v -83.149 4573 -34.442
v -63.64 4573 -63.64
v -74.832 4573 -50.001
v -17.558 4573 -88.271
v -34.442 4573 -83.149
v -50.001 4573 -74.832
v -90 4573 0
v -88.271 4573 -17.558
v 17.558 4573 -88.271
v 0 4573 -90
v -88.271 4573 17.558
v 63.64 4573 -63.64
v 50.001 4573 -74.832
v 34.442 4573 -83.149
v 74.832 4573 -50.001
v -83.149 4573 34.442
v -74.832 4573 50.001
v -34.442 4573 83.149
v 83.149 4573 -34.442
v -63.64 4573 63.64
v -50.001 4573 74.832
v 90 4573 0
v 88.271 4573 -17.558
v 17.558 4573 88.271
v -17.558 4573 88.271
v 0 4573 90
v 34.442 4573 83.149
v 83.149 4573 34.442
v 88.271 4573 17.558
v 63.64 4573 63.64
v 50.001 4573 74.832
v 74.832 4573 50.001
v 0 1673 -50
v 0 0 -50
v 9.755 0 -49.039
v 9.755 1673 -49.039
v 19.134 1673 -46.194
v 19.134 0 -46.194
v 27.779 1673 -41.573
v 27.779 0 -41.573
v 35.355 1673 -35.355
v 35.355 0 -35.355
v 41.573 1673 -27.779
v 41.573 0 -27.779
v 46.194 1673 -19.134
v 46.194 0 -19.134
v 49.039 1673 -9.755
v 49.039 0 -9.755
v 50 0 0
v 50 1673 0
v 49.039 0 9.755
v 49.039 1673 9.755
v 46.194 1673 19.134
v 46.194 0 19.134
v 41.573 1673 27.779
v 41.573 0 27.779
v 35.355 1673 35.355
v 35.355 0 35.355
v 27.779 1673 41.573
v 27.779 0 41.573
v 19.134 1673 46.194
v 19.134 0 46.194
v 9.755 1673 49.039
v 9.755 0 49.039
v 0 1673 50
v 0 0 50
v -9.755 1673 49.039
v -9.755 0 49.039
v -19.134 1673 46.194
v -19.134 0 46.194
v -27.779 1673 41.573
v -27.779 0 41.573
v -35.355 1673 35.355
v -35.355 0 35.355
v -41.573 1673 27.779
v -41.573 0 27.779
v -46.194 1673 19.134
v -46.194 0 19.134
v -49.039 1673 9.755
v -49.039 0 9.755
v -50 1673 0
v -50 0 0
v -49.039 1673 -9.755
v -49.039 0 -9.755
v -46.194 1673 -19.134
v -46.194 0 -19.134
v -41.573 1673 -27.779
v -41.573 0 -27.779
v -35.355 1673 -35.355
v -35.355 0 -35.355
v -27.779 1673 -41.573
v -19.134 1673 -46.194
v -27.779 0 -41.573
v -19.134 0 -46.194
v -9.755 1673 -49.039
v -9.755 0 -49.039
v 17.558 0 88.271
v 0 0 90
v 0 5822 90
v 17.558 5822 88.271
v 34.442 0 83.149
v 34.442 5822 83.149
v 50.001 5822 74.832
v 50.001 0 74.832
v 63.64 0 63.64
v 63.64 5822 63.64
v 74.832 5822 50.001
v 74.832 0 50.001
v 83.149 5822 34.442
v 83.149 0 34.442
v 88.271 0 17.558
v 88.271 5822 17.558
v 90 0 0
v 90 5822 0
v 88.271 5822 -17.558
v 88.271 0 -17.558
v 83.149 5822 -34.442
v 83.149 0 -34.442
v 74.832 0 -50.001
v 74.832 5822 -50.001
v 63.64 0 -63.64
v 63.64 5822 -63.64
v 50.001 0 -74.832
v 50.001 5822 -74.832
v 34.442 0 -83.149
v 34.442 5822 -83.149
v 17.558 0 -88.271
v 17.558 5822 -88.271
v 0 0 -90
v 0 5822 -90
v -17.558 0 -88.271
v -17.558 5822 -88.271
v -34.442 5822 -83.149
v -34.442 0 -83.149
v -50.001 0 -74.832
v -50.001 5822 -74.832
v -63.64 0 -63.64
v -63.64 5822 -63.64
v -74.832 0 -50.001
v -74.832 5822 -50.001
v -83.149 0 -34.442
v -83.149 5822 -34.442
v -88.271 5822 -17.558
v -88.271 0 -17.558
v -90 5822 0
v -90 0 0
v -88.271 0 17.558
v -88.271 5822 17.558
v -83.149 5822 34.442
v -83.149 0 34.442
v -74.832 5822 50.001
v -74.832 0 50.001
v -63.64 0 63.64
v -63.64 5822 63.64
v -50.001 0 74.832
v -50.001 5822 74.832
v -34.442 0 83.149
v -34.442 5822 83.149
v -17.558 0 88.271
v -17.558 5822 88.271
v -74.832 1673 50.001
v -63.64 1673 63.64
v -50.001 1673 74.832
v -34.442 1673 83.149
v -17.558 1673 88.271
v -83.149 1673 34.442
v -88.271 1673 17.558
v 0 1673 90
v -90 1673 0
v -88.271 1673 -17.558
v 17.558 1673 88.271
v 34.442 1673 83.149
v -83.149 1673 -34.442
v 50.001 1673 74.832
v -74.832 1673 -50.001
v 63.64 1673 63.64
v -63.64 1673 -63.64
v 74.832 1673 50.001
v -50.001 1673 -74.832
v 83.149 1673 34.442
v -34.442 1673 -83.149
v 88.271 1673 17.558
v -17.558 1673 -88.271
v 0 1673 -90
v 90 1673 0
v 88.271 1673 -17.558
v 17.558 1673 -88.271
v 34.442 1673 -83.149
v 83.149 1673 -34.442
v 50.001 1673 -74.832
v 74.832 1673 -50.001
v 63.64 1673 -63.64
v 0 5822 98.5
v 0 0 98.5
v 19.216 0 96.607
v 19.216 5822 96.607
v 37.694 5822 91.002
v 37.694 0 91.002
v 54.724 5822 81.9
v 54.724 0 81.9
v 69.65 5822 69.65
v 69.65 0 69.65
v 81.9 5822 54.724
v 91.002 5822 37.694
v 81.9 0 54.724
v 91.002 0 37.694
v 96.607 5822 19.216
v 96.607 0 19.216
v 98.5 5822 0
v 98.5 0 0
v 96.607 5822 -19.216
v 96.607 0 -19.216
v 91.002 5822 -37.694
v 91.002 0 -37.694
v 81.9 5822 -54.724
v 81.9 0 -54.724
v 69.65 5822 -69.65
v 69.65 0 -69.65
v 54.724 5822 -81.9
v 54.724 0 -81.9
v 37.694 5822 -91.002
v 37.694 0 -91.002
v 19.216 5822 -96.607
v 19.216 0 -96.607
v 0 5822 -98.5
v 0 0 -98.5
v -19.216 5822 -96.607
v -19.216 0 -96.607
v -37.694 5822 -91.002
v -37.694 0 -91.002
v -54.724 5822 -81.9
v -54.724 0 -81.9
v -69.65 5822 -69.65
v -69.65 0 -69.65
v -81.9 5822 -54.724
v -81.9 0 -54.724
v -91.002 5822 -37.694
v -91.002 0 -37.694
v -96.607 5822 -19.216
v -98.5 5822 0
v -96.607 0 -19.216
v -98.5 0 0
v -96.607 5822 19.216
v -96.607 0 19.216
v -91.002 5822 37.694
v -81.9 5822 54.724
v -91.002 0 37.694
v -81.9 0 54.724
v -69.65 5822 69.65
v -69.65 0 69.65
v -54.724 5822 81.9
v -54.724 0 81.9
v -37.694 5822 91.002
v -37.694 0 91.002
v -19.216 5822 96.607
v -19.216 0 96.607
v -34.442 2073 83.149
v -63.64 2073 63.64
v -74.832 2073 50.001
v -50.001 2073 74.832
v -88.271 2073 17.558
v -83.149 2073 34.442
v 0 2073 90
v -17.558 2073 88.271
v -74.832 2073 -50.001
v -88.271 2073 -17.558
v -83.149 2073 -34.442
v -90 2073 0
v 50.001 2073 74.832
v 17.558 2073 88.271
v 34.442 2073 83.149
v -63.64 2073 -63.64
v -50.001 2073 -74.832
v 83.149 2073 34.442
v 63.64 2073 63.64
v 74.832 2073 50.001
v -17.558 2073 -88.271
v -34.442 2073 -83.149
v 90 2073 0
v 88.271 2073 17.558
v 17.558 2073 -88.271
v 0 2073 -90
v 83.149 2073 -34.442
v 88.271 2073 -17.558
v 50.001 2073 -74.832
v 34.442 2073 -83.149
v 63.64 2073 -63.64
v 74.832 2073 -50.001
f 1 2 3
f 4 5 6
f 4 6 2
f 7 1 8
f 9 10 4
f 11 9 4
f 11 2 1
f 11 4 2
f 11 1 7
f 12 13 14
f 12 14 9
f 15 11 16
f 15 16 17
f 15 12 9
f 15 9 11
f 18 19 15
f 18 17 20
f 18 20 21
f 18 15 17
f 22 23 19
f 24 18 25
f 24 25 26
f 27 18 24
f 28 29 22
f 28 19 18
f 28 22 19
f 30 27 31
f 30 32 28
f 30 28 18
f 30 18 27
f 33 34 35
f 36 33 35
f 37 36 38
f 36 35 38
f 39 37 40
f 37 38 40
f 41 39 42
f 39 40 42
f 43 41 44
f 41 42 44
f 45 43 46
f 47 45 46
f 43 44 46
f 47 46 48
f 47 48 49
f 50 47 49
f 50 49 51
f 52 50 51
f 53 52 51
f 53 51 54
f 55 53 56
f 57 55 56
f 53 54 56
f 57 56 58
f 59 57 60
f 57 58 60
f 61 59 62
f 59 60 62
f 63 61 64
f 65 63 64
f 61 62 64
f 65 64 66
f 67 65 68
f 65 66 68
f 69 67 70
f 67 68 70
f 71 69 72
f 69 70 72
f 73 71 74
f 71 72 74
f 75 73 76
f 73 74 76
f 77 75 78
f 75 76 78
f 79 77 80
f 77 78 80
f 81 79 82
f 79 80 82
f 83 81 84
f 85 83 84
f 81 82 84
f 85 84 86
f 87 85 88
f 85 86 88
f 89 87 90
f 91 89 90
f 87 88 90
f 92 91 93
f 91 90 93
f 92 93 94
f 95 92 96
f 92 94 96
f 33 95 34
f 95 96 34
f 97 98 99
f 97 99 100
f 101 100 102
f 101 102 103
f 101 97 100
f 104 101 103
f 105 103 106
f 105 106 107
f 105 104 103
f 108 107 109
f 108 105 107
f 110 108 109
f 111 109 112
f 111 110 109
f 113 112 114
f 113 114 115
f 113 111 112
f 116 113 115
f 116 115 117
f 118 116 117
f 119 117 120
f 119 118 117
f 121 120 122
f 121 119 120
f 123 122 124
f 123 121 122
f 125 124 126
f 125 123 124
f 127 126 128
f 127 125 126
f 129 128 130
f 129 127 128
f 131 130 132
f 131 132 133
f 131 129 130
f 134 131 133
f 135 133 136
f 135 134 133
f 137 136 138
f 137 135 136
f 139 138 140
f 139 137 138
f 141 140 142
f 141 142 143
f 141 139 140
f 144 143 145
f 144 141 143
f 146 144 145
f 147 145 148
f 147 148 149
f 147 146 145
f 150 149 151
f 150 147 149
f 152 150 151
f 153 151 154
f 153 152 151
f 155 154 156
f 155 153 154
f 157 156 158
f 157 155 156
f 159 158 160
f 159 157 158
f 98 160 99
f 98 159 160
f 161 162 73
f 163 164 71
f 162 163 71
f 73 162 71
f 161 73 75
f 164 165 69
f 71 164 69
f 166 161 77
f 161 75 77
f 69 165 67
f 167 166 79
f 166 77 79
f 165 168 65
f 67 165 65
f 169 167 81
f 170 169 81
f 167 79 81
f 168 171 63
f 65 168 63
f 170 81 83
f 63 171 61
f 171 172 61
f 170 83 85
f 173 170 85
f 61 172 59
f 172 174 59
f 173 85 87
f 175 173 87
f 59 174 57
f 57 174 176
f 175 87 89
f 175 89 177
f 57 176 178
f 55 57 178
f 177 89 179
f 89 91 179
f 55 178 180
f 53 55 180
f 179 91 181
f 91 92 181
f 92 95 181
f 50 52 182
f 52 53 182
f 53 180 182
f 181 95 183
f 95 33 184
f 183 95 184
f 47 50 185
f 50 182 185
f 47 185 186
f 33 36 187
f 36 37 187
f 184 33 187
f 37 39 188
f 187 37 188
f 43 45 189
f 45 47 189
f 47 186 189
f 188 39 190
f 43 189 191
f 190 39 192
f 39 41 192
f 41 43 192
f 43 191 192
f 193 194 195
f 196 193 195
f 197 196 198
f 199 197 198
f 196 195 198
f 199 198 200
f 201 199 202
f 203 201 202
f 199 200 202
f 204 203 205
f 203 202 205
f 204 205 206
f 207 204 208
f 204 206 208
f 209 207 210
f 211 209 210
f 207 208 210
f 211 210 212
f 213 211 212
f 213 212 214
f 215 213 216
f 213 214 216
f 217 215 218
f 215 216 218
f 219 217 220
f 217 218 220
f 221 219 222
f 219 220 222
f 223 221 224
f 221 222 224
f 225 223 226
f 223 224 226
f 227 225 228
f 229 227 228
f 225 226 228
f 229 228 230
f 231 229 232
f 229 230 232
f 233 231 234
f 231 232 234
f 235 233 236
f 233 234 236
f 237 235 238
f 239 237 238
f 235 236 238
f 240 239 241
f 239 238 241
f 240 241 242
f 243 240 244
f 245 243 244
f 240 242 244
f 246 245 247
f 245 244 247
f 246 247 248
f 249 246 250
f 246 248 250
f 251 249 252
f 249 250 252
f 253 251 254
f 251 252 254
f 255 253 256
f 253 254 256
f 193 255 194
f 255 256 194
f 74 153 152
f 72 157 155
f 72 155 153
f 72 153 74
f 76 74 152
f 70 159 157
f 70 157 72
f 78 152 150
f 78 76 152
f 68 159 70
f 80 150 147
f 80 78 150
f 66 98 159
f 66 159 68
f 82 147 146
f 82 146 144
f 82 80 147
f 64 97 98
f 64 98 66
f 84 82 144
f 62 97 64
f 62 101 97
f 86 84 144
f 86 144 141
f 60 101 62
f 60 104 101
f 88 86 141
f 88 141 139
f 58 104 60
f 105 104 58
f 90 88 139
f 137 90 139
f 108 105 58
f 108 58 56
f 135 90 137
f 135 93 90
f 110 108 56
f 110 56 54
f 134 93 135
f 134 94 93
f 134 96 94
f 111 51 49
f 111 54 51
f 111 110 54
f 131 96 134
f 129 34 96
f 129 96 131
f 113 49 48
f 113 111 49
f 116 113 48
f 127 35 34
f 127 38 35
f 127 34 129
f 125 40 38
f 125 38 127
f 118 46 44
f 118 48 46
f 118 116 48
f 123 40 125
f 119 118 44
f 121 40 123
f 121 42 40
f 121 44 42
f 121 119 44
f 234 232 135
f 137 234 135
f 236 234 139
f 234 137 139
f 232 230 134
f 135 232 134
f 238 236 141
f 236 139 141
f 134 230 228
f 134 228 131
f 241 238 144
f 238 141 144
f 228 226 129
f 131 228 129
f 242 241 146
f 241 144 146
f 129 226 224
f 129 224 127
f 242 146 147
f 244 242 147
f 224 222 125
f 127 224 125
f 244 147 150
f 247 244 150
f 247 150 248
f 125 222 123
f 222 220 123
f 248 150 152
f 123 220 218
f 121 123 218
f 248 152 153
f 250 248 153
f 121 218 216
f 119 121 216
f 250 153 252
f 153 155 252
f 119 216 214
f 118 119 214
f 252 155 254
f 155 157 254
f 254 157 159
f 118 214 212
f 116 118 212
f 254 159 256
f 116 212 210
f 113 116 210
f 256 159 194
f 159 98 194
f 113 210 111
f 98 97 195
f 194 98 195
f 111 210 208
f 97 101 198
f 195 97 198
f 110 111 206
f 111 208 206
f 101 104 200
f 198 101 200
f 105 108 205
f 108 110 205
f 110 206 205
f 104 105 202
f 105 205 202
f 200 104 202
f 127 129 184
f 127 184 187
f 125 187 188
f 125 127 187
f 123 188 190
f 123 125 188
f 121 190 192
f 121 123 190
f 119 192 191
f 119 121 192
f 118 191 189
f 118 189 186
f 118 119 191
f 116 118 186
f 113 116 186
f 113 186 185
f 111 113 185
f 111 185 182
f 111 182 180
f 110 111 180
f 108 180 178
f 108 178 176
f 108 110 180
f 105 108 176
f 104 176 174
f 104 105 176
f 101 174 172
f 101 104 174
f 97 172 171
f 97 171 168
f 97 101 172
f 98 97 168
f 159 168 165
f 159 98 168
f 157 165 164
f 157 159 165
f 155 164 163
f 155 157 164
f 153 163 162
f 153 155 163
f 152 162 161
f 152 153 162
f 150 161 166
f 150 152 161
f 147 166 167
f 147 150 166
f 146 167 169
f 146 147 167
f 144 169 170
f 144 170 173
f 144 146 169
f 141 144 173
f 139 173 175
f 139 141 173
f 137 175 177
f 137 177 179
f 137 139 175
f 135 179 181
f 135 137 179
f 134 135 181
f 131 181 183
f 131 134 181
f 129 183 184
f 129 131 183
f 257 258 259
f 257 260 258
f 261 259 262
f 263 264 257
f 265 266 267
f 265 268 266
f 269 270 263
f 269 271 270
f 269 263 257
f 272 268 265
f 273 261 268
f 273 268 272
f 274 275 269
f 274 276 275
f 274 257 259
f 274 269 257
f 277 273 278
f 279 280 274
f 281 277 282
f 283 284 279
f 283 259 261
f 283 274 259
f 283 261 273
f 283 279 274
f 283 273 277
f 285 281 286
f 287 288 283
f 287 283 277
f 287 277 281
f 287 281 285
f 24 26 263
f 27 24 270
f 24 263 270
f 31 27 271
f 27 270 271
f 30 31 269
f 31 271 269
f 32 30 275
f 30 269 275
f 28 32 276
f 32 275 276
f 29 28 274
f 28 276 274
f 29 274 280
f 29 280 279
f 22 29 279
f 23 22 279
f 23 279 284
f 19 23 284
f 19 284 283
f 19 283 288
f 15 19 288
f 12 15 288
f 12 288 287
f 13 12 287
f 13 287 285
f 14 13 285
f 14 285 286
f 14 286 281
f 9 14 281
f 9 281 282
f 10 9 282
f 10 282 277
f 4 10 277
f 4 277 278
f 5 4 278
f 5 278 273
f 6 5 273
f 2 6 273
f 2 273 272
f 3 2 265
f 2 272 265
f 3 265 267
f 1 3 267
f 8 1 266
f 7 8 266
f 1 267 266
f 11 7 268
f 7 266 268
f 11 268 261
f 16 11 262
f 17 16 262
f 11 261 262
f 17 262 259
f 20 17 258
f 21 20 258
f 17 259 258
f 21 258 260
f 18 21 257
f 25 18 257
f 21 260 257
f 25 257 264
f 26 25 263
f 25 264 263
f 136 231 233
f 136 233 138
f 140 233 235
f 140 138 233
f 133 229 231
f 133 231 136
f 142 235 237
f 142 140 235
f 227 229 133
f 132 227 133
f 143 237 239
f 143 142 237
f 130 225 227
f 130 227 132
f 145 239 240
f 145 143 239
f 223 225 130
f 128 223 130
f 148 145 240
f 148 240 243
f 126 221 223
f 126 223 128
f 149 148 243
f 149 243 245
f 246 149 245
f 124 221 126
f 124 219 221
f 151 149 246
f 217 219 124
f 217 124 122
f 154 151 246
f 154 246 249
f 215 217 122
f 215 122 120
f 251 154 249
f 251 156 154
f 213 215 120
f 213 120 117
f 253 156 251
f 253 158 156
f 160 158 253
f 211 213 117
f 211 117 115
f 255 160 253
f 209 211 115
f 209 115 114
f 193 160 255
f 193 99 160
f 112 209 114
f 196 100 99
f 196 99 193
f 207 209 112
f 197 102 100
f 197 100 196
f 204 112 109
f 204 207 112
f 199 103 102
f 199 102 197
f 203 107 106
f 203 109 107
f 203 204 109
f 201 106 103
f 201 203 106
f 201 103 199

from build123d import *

# Parameters (mm, degrees)
SKETCH1_R          = 98.5
SKETCH1_R_2        = 90
ROCKET_SHELL_DEPTH = 5822
SKETCH2_R          = 90
SKETCH2_R_2        = 50
SOLID_FUEL_DEPTH   = 1673
SKETCH3_R          = 90
LIQUID_FUEL_DEPTH  = 2900
SKETCH4_R          = 90
CUT_CORE_OUT_DEPTH = 400


with BuildPart() as part:
    # Sketch1 → Rocket Shell (new body)
    with BuildSketch(Plane(origin=(0, 0, 0), x_dir=(1, 0, 0), z_dir=(0, 1, 0))):
        with Locations(Location((0, 0, 0), (0, 0, 270))):
            Circle(SKETCH1_R)
        with Locations(Location((0, 0, 0), (0, 0, 270))):
            Circle(SKETCH1_R_2, mode=Mode.SUBTRACT)
    extrude(amount=ROCKET_SHELL_DEPTH)


with BuildPart() as body_2:
    # Sketch2 → Solid Fuel (new body)
    with BuildSketch(Plane.XZ):
        with Locations(Location((0, 0, 0), (0, 0, 270))):
            Circle(SKETCH2_R)
        with Locations(Location((0, 0, 0), (0, 0, 270))):
            Circle(SKETCH2_R_2, mode=Mode.SUBTRACT)
    extrude(amount=-SOLID_FUEL_DEPTH)


with BuildPart() as body_3:
    # Sketch3 → Liquid Fuel (new body)
    with BuildSketch(Plane(origin=(0, 1673, 0), x_dir=(1, 0, 0), z_dir=(0, 1, 0))):
        with Locations(Location((0, 0, 0), (0, 0, 270))):
            Circle(SKETCH3_R)
    extrude(amount=LIQUID_FUEL_DEPTH)

    # Sketch4 → Cut Core Out (cut)
    with BuildSketch(Plane.XZ.offset(-1673)):
        with Locations(Location((0, 0, 0), (0, 0, 270))):
            Circle(SKETCH4_R)
    extrude(amount=-CUT_CORE_OUT_DEPTH, mode=Mode.SUBTRACT)


solid = Compound([part.part, body_2.part, body_3.part])
